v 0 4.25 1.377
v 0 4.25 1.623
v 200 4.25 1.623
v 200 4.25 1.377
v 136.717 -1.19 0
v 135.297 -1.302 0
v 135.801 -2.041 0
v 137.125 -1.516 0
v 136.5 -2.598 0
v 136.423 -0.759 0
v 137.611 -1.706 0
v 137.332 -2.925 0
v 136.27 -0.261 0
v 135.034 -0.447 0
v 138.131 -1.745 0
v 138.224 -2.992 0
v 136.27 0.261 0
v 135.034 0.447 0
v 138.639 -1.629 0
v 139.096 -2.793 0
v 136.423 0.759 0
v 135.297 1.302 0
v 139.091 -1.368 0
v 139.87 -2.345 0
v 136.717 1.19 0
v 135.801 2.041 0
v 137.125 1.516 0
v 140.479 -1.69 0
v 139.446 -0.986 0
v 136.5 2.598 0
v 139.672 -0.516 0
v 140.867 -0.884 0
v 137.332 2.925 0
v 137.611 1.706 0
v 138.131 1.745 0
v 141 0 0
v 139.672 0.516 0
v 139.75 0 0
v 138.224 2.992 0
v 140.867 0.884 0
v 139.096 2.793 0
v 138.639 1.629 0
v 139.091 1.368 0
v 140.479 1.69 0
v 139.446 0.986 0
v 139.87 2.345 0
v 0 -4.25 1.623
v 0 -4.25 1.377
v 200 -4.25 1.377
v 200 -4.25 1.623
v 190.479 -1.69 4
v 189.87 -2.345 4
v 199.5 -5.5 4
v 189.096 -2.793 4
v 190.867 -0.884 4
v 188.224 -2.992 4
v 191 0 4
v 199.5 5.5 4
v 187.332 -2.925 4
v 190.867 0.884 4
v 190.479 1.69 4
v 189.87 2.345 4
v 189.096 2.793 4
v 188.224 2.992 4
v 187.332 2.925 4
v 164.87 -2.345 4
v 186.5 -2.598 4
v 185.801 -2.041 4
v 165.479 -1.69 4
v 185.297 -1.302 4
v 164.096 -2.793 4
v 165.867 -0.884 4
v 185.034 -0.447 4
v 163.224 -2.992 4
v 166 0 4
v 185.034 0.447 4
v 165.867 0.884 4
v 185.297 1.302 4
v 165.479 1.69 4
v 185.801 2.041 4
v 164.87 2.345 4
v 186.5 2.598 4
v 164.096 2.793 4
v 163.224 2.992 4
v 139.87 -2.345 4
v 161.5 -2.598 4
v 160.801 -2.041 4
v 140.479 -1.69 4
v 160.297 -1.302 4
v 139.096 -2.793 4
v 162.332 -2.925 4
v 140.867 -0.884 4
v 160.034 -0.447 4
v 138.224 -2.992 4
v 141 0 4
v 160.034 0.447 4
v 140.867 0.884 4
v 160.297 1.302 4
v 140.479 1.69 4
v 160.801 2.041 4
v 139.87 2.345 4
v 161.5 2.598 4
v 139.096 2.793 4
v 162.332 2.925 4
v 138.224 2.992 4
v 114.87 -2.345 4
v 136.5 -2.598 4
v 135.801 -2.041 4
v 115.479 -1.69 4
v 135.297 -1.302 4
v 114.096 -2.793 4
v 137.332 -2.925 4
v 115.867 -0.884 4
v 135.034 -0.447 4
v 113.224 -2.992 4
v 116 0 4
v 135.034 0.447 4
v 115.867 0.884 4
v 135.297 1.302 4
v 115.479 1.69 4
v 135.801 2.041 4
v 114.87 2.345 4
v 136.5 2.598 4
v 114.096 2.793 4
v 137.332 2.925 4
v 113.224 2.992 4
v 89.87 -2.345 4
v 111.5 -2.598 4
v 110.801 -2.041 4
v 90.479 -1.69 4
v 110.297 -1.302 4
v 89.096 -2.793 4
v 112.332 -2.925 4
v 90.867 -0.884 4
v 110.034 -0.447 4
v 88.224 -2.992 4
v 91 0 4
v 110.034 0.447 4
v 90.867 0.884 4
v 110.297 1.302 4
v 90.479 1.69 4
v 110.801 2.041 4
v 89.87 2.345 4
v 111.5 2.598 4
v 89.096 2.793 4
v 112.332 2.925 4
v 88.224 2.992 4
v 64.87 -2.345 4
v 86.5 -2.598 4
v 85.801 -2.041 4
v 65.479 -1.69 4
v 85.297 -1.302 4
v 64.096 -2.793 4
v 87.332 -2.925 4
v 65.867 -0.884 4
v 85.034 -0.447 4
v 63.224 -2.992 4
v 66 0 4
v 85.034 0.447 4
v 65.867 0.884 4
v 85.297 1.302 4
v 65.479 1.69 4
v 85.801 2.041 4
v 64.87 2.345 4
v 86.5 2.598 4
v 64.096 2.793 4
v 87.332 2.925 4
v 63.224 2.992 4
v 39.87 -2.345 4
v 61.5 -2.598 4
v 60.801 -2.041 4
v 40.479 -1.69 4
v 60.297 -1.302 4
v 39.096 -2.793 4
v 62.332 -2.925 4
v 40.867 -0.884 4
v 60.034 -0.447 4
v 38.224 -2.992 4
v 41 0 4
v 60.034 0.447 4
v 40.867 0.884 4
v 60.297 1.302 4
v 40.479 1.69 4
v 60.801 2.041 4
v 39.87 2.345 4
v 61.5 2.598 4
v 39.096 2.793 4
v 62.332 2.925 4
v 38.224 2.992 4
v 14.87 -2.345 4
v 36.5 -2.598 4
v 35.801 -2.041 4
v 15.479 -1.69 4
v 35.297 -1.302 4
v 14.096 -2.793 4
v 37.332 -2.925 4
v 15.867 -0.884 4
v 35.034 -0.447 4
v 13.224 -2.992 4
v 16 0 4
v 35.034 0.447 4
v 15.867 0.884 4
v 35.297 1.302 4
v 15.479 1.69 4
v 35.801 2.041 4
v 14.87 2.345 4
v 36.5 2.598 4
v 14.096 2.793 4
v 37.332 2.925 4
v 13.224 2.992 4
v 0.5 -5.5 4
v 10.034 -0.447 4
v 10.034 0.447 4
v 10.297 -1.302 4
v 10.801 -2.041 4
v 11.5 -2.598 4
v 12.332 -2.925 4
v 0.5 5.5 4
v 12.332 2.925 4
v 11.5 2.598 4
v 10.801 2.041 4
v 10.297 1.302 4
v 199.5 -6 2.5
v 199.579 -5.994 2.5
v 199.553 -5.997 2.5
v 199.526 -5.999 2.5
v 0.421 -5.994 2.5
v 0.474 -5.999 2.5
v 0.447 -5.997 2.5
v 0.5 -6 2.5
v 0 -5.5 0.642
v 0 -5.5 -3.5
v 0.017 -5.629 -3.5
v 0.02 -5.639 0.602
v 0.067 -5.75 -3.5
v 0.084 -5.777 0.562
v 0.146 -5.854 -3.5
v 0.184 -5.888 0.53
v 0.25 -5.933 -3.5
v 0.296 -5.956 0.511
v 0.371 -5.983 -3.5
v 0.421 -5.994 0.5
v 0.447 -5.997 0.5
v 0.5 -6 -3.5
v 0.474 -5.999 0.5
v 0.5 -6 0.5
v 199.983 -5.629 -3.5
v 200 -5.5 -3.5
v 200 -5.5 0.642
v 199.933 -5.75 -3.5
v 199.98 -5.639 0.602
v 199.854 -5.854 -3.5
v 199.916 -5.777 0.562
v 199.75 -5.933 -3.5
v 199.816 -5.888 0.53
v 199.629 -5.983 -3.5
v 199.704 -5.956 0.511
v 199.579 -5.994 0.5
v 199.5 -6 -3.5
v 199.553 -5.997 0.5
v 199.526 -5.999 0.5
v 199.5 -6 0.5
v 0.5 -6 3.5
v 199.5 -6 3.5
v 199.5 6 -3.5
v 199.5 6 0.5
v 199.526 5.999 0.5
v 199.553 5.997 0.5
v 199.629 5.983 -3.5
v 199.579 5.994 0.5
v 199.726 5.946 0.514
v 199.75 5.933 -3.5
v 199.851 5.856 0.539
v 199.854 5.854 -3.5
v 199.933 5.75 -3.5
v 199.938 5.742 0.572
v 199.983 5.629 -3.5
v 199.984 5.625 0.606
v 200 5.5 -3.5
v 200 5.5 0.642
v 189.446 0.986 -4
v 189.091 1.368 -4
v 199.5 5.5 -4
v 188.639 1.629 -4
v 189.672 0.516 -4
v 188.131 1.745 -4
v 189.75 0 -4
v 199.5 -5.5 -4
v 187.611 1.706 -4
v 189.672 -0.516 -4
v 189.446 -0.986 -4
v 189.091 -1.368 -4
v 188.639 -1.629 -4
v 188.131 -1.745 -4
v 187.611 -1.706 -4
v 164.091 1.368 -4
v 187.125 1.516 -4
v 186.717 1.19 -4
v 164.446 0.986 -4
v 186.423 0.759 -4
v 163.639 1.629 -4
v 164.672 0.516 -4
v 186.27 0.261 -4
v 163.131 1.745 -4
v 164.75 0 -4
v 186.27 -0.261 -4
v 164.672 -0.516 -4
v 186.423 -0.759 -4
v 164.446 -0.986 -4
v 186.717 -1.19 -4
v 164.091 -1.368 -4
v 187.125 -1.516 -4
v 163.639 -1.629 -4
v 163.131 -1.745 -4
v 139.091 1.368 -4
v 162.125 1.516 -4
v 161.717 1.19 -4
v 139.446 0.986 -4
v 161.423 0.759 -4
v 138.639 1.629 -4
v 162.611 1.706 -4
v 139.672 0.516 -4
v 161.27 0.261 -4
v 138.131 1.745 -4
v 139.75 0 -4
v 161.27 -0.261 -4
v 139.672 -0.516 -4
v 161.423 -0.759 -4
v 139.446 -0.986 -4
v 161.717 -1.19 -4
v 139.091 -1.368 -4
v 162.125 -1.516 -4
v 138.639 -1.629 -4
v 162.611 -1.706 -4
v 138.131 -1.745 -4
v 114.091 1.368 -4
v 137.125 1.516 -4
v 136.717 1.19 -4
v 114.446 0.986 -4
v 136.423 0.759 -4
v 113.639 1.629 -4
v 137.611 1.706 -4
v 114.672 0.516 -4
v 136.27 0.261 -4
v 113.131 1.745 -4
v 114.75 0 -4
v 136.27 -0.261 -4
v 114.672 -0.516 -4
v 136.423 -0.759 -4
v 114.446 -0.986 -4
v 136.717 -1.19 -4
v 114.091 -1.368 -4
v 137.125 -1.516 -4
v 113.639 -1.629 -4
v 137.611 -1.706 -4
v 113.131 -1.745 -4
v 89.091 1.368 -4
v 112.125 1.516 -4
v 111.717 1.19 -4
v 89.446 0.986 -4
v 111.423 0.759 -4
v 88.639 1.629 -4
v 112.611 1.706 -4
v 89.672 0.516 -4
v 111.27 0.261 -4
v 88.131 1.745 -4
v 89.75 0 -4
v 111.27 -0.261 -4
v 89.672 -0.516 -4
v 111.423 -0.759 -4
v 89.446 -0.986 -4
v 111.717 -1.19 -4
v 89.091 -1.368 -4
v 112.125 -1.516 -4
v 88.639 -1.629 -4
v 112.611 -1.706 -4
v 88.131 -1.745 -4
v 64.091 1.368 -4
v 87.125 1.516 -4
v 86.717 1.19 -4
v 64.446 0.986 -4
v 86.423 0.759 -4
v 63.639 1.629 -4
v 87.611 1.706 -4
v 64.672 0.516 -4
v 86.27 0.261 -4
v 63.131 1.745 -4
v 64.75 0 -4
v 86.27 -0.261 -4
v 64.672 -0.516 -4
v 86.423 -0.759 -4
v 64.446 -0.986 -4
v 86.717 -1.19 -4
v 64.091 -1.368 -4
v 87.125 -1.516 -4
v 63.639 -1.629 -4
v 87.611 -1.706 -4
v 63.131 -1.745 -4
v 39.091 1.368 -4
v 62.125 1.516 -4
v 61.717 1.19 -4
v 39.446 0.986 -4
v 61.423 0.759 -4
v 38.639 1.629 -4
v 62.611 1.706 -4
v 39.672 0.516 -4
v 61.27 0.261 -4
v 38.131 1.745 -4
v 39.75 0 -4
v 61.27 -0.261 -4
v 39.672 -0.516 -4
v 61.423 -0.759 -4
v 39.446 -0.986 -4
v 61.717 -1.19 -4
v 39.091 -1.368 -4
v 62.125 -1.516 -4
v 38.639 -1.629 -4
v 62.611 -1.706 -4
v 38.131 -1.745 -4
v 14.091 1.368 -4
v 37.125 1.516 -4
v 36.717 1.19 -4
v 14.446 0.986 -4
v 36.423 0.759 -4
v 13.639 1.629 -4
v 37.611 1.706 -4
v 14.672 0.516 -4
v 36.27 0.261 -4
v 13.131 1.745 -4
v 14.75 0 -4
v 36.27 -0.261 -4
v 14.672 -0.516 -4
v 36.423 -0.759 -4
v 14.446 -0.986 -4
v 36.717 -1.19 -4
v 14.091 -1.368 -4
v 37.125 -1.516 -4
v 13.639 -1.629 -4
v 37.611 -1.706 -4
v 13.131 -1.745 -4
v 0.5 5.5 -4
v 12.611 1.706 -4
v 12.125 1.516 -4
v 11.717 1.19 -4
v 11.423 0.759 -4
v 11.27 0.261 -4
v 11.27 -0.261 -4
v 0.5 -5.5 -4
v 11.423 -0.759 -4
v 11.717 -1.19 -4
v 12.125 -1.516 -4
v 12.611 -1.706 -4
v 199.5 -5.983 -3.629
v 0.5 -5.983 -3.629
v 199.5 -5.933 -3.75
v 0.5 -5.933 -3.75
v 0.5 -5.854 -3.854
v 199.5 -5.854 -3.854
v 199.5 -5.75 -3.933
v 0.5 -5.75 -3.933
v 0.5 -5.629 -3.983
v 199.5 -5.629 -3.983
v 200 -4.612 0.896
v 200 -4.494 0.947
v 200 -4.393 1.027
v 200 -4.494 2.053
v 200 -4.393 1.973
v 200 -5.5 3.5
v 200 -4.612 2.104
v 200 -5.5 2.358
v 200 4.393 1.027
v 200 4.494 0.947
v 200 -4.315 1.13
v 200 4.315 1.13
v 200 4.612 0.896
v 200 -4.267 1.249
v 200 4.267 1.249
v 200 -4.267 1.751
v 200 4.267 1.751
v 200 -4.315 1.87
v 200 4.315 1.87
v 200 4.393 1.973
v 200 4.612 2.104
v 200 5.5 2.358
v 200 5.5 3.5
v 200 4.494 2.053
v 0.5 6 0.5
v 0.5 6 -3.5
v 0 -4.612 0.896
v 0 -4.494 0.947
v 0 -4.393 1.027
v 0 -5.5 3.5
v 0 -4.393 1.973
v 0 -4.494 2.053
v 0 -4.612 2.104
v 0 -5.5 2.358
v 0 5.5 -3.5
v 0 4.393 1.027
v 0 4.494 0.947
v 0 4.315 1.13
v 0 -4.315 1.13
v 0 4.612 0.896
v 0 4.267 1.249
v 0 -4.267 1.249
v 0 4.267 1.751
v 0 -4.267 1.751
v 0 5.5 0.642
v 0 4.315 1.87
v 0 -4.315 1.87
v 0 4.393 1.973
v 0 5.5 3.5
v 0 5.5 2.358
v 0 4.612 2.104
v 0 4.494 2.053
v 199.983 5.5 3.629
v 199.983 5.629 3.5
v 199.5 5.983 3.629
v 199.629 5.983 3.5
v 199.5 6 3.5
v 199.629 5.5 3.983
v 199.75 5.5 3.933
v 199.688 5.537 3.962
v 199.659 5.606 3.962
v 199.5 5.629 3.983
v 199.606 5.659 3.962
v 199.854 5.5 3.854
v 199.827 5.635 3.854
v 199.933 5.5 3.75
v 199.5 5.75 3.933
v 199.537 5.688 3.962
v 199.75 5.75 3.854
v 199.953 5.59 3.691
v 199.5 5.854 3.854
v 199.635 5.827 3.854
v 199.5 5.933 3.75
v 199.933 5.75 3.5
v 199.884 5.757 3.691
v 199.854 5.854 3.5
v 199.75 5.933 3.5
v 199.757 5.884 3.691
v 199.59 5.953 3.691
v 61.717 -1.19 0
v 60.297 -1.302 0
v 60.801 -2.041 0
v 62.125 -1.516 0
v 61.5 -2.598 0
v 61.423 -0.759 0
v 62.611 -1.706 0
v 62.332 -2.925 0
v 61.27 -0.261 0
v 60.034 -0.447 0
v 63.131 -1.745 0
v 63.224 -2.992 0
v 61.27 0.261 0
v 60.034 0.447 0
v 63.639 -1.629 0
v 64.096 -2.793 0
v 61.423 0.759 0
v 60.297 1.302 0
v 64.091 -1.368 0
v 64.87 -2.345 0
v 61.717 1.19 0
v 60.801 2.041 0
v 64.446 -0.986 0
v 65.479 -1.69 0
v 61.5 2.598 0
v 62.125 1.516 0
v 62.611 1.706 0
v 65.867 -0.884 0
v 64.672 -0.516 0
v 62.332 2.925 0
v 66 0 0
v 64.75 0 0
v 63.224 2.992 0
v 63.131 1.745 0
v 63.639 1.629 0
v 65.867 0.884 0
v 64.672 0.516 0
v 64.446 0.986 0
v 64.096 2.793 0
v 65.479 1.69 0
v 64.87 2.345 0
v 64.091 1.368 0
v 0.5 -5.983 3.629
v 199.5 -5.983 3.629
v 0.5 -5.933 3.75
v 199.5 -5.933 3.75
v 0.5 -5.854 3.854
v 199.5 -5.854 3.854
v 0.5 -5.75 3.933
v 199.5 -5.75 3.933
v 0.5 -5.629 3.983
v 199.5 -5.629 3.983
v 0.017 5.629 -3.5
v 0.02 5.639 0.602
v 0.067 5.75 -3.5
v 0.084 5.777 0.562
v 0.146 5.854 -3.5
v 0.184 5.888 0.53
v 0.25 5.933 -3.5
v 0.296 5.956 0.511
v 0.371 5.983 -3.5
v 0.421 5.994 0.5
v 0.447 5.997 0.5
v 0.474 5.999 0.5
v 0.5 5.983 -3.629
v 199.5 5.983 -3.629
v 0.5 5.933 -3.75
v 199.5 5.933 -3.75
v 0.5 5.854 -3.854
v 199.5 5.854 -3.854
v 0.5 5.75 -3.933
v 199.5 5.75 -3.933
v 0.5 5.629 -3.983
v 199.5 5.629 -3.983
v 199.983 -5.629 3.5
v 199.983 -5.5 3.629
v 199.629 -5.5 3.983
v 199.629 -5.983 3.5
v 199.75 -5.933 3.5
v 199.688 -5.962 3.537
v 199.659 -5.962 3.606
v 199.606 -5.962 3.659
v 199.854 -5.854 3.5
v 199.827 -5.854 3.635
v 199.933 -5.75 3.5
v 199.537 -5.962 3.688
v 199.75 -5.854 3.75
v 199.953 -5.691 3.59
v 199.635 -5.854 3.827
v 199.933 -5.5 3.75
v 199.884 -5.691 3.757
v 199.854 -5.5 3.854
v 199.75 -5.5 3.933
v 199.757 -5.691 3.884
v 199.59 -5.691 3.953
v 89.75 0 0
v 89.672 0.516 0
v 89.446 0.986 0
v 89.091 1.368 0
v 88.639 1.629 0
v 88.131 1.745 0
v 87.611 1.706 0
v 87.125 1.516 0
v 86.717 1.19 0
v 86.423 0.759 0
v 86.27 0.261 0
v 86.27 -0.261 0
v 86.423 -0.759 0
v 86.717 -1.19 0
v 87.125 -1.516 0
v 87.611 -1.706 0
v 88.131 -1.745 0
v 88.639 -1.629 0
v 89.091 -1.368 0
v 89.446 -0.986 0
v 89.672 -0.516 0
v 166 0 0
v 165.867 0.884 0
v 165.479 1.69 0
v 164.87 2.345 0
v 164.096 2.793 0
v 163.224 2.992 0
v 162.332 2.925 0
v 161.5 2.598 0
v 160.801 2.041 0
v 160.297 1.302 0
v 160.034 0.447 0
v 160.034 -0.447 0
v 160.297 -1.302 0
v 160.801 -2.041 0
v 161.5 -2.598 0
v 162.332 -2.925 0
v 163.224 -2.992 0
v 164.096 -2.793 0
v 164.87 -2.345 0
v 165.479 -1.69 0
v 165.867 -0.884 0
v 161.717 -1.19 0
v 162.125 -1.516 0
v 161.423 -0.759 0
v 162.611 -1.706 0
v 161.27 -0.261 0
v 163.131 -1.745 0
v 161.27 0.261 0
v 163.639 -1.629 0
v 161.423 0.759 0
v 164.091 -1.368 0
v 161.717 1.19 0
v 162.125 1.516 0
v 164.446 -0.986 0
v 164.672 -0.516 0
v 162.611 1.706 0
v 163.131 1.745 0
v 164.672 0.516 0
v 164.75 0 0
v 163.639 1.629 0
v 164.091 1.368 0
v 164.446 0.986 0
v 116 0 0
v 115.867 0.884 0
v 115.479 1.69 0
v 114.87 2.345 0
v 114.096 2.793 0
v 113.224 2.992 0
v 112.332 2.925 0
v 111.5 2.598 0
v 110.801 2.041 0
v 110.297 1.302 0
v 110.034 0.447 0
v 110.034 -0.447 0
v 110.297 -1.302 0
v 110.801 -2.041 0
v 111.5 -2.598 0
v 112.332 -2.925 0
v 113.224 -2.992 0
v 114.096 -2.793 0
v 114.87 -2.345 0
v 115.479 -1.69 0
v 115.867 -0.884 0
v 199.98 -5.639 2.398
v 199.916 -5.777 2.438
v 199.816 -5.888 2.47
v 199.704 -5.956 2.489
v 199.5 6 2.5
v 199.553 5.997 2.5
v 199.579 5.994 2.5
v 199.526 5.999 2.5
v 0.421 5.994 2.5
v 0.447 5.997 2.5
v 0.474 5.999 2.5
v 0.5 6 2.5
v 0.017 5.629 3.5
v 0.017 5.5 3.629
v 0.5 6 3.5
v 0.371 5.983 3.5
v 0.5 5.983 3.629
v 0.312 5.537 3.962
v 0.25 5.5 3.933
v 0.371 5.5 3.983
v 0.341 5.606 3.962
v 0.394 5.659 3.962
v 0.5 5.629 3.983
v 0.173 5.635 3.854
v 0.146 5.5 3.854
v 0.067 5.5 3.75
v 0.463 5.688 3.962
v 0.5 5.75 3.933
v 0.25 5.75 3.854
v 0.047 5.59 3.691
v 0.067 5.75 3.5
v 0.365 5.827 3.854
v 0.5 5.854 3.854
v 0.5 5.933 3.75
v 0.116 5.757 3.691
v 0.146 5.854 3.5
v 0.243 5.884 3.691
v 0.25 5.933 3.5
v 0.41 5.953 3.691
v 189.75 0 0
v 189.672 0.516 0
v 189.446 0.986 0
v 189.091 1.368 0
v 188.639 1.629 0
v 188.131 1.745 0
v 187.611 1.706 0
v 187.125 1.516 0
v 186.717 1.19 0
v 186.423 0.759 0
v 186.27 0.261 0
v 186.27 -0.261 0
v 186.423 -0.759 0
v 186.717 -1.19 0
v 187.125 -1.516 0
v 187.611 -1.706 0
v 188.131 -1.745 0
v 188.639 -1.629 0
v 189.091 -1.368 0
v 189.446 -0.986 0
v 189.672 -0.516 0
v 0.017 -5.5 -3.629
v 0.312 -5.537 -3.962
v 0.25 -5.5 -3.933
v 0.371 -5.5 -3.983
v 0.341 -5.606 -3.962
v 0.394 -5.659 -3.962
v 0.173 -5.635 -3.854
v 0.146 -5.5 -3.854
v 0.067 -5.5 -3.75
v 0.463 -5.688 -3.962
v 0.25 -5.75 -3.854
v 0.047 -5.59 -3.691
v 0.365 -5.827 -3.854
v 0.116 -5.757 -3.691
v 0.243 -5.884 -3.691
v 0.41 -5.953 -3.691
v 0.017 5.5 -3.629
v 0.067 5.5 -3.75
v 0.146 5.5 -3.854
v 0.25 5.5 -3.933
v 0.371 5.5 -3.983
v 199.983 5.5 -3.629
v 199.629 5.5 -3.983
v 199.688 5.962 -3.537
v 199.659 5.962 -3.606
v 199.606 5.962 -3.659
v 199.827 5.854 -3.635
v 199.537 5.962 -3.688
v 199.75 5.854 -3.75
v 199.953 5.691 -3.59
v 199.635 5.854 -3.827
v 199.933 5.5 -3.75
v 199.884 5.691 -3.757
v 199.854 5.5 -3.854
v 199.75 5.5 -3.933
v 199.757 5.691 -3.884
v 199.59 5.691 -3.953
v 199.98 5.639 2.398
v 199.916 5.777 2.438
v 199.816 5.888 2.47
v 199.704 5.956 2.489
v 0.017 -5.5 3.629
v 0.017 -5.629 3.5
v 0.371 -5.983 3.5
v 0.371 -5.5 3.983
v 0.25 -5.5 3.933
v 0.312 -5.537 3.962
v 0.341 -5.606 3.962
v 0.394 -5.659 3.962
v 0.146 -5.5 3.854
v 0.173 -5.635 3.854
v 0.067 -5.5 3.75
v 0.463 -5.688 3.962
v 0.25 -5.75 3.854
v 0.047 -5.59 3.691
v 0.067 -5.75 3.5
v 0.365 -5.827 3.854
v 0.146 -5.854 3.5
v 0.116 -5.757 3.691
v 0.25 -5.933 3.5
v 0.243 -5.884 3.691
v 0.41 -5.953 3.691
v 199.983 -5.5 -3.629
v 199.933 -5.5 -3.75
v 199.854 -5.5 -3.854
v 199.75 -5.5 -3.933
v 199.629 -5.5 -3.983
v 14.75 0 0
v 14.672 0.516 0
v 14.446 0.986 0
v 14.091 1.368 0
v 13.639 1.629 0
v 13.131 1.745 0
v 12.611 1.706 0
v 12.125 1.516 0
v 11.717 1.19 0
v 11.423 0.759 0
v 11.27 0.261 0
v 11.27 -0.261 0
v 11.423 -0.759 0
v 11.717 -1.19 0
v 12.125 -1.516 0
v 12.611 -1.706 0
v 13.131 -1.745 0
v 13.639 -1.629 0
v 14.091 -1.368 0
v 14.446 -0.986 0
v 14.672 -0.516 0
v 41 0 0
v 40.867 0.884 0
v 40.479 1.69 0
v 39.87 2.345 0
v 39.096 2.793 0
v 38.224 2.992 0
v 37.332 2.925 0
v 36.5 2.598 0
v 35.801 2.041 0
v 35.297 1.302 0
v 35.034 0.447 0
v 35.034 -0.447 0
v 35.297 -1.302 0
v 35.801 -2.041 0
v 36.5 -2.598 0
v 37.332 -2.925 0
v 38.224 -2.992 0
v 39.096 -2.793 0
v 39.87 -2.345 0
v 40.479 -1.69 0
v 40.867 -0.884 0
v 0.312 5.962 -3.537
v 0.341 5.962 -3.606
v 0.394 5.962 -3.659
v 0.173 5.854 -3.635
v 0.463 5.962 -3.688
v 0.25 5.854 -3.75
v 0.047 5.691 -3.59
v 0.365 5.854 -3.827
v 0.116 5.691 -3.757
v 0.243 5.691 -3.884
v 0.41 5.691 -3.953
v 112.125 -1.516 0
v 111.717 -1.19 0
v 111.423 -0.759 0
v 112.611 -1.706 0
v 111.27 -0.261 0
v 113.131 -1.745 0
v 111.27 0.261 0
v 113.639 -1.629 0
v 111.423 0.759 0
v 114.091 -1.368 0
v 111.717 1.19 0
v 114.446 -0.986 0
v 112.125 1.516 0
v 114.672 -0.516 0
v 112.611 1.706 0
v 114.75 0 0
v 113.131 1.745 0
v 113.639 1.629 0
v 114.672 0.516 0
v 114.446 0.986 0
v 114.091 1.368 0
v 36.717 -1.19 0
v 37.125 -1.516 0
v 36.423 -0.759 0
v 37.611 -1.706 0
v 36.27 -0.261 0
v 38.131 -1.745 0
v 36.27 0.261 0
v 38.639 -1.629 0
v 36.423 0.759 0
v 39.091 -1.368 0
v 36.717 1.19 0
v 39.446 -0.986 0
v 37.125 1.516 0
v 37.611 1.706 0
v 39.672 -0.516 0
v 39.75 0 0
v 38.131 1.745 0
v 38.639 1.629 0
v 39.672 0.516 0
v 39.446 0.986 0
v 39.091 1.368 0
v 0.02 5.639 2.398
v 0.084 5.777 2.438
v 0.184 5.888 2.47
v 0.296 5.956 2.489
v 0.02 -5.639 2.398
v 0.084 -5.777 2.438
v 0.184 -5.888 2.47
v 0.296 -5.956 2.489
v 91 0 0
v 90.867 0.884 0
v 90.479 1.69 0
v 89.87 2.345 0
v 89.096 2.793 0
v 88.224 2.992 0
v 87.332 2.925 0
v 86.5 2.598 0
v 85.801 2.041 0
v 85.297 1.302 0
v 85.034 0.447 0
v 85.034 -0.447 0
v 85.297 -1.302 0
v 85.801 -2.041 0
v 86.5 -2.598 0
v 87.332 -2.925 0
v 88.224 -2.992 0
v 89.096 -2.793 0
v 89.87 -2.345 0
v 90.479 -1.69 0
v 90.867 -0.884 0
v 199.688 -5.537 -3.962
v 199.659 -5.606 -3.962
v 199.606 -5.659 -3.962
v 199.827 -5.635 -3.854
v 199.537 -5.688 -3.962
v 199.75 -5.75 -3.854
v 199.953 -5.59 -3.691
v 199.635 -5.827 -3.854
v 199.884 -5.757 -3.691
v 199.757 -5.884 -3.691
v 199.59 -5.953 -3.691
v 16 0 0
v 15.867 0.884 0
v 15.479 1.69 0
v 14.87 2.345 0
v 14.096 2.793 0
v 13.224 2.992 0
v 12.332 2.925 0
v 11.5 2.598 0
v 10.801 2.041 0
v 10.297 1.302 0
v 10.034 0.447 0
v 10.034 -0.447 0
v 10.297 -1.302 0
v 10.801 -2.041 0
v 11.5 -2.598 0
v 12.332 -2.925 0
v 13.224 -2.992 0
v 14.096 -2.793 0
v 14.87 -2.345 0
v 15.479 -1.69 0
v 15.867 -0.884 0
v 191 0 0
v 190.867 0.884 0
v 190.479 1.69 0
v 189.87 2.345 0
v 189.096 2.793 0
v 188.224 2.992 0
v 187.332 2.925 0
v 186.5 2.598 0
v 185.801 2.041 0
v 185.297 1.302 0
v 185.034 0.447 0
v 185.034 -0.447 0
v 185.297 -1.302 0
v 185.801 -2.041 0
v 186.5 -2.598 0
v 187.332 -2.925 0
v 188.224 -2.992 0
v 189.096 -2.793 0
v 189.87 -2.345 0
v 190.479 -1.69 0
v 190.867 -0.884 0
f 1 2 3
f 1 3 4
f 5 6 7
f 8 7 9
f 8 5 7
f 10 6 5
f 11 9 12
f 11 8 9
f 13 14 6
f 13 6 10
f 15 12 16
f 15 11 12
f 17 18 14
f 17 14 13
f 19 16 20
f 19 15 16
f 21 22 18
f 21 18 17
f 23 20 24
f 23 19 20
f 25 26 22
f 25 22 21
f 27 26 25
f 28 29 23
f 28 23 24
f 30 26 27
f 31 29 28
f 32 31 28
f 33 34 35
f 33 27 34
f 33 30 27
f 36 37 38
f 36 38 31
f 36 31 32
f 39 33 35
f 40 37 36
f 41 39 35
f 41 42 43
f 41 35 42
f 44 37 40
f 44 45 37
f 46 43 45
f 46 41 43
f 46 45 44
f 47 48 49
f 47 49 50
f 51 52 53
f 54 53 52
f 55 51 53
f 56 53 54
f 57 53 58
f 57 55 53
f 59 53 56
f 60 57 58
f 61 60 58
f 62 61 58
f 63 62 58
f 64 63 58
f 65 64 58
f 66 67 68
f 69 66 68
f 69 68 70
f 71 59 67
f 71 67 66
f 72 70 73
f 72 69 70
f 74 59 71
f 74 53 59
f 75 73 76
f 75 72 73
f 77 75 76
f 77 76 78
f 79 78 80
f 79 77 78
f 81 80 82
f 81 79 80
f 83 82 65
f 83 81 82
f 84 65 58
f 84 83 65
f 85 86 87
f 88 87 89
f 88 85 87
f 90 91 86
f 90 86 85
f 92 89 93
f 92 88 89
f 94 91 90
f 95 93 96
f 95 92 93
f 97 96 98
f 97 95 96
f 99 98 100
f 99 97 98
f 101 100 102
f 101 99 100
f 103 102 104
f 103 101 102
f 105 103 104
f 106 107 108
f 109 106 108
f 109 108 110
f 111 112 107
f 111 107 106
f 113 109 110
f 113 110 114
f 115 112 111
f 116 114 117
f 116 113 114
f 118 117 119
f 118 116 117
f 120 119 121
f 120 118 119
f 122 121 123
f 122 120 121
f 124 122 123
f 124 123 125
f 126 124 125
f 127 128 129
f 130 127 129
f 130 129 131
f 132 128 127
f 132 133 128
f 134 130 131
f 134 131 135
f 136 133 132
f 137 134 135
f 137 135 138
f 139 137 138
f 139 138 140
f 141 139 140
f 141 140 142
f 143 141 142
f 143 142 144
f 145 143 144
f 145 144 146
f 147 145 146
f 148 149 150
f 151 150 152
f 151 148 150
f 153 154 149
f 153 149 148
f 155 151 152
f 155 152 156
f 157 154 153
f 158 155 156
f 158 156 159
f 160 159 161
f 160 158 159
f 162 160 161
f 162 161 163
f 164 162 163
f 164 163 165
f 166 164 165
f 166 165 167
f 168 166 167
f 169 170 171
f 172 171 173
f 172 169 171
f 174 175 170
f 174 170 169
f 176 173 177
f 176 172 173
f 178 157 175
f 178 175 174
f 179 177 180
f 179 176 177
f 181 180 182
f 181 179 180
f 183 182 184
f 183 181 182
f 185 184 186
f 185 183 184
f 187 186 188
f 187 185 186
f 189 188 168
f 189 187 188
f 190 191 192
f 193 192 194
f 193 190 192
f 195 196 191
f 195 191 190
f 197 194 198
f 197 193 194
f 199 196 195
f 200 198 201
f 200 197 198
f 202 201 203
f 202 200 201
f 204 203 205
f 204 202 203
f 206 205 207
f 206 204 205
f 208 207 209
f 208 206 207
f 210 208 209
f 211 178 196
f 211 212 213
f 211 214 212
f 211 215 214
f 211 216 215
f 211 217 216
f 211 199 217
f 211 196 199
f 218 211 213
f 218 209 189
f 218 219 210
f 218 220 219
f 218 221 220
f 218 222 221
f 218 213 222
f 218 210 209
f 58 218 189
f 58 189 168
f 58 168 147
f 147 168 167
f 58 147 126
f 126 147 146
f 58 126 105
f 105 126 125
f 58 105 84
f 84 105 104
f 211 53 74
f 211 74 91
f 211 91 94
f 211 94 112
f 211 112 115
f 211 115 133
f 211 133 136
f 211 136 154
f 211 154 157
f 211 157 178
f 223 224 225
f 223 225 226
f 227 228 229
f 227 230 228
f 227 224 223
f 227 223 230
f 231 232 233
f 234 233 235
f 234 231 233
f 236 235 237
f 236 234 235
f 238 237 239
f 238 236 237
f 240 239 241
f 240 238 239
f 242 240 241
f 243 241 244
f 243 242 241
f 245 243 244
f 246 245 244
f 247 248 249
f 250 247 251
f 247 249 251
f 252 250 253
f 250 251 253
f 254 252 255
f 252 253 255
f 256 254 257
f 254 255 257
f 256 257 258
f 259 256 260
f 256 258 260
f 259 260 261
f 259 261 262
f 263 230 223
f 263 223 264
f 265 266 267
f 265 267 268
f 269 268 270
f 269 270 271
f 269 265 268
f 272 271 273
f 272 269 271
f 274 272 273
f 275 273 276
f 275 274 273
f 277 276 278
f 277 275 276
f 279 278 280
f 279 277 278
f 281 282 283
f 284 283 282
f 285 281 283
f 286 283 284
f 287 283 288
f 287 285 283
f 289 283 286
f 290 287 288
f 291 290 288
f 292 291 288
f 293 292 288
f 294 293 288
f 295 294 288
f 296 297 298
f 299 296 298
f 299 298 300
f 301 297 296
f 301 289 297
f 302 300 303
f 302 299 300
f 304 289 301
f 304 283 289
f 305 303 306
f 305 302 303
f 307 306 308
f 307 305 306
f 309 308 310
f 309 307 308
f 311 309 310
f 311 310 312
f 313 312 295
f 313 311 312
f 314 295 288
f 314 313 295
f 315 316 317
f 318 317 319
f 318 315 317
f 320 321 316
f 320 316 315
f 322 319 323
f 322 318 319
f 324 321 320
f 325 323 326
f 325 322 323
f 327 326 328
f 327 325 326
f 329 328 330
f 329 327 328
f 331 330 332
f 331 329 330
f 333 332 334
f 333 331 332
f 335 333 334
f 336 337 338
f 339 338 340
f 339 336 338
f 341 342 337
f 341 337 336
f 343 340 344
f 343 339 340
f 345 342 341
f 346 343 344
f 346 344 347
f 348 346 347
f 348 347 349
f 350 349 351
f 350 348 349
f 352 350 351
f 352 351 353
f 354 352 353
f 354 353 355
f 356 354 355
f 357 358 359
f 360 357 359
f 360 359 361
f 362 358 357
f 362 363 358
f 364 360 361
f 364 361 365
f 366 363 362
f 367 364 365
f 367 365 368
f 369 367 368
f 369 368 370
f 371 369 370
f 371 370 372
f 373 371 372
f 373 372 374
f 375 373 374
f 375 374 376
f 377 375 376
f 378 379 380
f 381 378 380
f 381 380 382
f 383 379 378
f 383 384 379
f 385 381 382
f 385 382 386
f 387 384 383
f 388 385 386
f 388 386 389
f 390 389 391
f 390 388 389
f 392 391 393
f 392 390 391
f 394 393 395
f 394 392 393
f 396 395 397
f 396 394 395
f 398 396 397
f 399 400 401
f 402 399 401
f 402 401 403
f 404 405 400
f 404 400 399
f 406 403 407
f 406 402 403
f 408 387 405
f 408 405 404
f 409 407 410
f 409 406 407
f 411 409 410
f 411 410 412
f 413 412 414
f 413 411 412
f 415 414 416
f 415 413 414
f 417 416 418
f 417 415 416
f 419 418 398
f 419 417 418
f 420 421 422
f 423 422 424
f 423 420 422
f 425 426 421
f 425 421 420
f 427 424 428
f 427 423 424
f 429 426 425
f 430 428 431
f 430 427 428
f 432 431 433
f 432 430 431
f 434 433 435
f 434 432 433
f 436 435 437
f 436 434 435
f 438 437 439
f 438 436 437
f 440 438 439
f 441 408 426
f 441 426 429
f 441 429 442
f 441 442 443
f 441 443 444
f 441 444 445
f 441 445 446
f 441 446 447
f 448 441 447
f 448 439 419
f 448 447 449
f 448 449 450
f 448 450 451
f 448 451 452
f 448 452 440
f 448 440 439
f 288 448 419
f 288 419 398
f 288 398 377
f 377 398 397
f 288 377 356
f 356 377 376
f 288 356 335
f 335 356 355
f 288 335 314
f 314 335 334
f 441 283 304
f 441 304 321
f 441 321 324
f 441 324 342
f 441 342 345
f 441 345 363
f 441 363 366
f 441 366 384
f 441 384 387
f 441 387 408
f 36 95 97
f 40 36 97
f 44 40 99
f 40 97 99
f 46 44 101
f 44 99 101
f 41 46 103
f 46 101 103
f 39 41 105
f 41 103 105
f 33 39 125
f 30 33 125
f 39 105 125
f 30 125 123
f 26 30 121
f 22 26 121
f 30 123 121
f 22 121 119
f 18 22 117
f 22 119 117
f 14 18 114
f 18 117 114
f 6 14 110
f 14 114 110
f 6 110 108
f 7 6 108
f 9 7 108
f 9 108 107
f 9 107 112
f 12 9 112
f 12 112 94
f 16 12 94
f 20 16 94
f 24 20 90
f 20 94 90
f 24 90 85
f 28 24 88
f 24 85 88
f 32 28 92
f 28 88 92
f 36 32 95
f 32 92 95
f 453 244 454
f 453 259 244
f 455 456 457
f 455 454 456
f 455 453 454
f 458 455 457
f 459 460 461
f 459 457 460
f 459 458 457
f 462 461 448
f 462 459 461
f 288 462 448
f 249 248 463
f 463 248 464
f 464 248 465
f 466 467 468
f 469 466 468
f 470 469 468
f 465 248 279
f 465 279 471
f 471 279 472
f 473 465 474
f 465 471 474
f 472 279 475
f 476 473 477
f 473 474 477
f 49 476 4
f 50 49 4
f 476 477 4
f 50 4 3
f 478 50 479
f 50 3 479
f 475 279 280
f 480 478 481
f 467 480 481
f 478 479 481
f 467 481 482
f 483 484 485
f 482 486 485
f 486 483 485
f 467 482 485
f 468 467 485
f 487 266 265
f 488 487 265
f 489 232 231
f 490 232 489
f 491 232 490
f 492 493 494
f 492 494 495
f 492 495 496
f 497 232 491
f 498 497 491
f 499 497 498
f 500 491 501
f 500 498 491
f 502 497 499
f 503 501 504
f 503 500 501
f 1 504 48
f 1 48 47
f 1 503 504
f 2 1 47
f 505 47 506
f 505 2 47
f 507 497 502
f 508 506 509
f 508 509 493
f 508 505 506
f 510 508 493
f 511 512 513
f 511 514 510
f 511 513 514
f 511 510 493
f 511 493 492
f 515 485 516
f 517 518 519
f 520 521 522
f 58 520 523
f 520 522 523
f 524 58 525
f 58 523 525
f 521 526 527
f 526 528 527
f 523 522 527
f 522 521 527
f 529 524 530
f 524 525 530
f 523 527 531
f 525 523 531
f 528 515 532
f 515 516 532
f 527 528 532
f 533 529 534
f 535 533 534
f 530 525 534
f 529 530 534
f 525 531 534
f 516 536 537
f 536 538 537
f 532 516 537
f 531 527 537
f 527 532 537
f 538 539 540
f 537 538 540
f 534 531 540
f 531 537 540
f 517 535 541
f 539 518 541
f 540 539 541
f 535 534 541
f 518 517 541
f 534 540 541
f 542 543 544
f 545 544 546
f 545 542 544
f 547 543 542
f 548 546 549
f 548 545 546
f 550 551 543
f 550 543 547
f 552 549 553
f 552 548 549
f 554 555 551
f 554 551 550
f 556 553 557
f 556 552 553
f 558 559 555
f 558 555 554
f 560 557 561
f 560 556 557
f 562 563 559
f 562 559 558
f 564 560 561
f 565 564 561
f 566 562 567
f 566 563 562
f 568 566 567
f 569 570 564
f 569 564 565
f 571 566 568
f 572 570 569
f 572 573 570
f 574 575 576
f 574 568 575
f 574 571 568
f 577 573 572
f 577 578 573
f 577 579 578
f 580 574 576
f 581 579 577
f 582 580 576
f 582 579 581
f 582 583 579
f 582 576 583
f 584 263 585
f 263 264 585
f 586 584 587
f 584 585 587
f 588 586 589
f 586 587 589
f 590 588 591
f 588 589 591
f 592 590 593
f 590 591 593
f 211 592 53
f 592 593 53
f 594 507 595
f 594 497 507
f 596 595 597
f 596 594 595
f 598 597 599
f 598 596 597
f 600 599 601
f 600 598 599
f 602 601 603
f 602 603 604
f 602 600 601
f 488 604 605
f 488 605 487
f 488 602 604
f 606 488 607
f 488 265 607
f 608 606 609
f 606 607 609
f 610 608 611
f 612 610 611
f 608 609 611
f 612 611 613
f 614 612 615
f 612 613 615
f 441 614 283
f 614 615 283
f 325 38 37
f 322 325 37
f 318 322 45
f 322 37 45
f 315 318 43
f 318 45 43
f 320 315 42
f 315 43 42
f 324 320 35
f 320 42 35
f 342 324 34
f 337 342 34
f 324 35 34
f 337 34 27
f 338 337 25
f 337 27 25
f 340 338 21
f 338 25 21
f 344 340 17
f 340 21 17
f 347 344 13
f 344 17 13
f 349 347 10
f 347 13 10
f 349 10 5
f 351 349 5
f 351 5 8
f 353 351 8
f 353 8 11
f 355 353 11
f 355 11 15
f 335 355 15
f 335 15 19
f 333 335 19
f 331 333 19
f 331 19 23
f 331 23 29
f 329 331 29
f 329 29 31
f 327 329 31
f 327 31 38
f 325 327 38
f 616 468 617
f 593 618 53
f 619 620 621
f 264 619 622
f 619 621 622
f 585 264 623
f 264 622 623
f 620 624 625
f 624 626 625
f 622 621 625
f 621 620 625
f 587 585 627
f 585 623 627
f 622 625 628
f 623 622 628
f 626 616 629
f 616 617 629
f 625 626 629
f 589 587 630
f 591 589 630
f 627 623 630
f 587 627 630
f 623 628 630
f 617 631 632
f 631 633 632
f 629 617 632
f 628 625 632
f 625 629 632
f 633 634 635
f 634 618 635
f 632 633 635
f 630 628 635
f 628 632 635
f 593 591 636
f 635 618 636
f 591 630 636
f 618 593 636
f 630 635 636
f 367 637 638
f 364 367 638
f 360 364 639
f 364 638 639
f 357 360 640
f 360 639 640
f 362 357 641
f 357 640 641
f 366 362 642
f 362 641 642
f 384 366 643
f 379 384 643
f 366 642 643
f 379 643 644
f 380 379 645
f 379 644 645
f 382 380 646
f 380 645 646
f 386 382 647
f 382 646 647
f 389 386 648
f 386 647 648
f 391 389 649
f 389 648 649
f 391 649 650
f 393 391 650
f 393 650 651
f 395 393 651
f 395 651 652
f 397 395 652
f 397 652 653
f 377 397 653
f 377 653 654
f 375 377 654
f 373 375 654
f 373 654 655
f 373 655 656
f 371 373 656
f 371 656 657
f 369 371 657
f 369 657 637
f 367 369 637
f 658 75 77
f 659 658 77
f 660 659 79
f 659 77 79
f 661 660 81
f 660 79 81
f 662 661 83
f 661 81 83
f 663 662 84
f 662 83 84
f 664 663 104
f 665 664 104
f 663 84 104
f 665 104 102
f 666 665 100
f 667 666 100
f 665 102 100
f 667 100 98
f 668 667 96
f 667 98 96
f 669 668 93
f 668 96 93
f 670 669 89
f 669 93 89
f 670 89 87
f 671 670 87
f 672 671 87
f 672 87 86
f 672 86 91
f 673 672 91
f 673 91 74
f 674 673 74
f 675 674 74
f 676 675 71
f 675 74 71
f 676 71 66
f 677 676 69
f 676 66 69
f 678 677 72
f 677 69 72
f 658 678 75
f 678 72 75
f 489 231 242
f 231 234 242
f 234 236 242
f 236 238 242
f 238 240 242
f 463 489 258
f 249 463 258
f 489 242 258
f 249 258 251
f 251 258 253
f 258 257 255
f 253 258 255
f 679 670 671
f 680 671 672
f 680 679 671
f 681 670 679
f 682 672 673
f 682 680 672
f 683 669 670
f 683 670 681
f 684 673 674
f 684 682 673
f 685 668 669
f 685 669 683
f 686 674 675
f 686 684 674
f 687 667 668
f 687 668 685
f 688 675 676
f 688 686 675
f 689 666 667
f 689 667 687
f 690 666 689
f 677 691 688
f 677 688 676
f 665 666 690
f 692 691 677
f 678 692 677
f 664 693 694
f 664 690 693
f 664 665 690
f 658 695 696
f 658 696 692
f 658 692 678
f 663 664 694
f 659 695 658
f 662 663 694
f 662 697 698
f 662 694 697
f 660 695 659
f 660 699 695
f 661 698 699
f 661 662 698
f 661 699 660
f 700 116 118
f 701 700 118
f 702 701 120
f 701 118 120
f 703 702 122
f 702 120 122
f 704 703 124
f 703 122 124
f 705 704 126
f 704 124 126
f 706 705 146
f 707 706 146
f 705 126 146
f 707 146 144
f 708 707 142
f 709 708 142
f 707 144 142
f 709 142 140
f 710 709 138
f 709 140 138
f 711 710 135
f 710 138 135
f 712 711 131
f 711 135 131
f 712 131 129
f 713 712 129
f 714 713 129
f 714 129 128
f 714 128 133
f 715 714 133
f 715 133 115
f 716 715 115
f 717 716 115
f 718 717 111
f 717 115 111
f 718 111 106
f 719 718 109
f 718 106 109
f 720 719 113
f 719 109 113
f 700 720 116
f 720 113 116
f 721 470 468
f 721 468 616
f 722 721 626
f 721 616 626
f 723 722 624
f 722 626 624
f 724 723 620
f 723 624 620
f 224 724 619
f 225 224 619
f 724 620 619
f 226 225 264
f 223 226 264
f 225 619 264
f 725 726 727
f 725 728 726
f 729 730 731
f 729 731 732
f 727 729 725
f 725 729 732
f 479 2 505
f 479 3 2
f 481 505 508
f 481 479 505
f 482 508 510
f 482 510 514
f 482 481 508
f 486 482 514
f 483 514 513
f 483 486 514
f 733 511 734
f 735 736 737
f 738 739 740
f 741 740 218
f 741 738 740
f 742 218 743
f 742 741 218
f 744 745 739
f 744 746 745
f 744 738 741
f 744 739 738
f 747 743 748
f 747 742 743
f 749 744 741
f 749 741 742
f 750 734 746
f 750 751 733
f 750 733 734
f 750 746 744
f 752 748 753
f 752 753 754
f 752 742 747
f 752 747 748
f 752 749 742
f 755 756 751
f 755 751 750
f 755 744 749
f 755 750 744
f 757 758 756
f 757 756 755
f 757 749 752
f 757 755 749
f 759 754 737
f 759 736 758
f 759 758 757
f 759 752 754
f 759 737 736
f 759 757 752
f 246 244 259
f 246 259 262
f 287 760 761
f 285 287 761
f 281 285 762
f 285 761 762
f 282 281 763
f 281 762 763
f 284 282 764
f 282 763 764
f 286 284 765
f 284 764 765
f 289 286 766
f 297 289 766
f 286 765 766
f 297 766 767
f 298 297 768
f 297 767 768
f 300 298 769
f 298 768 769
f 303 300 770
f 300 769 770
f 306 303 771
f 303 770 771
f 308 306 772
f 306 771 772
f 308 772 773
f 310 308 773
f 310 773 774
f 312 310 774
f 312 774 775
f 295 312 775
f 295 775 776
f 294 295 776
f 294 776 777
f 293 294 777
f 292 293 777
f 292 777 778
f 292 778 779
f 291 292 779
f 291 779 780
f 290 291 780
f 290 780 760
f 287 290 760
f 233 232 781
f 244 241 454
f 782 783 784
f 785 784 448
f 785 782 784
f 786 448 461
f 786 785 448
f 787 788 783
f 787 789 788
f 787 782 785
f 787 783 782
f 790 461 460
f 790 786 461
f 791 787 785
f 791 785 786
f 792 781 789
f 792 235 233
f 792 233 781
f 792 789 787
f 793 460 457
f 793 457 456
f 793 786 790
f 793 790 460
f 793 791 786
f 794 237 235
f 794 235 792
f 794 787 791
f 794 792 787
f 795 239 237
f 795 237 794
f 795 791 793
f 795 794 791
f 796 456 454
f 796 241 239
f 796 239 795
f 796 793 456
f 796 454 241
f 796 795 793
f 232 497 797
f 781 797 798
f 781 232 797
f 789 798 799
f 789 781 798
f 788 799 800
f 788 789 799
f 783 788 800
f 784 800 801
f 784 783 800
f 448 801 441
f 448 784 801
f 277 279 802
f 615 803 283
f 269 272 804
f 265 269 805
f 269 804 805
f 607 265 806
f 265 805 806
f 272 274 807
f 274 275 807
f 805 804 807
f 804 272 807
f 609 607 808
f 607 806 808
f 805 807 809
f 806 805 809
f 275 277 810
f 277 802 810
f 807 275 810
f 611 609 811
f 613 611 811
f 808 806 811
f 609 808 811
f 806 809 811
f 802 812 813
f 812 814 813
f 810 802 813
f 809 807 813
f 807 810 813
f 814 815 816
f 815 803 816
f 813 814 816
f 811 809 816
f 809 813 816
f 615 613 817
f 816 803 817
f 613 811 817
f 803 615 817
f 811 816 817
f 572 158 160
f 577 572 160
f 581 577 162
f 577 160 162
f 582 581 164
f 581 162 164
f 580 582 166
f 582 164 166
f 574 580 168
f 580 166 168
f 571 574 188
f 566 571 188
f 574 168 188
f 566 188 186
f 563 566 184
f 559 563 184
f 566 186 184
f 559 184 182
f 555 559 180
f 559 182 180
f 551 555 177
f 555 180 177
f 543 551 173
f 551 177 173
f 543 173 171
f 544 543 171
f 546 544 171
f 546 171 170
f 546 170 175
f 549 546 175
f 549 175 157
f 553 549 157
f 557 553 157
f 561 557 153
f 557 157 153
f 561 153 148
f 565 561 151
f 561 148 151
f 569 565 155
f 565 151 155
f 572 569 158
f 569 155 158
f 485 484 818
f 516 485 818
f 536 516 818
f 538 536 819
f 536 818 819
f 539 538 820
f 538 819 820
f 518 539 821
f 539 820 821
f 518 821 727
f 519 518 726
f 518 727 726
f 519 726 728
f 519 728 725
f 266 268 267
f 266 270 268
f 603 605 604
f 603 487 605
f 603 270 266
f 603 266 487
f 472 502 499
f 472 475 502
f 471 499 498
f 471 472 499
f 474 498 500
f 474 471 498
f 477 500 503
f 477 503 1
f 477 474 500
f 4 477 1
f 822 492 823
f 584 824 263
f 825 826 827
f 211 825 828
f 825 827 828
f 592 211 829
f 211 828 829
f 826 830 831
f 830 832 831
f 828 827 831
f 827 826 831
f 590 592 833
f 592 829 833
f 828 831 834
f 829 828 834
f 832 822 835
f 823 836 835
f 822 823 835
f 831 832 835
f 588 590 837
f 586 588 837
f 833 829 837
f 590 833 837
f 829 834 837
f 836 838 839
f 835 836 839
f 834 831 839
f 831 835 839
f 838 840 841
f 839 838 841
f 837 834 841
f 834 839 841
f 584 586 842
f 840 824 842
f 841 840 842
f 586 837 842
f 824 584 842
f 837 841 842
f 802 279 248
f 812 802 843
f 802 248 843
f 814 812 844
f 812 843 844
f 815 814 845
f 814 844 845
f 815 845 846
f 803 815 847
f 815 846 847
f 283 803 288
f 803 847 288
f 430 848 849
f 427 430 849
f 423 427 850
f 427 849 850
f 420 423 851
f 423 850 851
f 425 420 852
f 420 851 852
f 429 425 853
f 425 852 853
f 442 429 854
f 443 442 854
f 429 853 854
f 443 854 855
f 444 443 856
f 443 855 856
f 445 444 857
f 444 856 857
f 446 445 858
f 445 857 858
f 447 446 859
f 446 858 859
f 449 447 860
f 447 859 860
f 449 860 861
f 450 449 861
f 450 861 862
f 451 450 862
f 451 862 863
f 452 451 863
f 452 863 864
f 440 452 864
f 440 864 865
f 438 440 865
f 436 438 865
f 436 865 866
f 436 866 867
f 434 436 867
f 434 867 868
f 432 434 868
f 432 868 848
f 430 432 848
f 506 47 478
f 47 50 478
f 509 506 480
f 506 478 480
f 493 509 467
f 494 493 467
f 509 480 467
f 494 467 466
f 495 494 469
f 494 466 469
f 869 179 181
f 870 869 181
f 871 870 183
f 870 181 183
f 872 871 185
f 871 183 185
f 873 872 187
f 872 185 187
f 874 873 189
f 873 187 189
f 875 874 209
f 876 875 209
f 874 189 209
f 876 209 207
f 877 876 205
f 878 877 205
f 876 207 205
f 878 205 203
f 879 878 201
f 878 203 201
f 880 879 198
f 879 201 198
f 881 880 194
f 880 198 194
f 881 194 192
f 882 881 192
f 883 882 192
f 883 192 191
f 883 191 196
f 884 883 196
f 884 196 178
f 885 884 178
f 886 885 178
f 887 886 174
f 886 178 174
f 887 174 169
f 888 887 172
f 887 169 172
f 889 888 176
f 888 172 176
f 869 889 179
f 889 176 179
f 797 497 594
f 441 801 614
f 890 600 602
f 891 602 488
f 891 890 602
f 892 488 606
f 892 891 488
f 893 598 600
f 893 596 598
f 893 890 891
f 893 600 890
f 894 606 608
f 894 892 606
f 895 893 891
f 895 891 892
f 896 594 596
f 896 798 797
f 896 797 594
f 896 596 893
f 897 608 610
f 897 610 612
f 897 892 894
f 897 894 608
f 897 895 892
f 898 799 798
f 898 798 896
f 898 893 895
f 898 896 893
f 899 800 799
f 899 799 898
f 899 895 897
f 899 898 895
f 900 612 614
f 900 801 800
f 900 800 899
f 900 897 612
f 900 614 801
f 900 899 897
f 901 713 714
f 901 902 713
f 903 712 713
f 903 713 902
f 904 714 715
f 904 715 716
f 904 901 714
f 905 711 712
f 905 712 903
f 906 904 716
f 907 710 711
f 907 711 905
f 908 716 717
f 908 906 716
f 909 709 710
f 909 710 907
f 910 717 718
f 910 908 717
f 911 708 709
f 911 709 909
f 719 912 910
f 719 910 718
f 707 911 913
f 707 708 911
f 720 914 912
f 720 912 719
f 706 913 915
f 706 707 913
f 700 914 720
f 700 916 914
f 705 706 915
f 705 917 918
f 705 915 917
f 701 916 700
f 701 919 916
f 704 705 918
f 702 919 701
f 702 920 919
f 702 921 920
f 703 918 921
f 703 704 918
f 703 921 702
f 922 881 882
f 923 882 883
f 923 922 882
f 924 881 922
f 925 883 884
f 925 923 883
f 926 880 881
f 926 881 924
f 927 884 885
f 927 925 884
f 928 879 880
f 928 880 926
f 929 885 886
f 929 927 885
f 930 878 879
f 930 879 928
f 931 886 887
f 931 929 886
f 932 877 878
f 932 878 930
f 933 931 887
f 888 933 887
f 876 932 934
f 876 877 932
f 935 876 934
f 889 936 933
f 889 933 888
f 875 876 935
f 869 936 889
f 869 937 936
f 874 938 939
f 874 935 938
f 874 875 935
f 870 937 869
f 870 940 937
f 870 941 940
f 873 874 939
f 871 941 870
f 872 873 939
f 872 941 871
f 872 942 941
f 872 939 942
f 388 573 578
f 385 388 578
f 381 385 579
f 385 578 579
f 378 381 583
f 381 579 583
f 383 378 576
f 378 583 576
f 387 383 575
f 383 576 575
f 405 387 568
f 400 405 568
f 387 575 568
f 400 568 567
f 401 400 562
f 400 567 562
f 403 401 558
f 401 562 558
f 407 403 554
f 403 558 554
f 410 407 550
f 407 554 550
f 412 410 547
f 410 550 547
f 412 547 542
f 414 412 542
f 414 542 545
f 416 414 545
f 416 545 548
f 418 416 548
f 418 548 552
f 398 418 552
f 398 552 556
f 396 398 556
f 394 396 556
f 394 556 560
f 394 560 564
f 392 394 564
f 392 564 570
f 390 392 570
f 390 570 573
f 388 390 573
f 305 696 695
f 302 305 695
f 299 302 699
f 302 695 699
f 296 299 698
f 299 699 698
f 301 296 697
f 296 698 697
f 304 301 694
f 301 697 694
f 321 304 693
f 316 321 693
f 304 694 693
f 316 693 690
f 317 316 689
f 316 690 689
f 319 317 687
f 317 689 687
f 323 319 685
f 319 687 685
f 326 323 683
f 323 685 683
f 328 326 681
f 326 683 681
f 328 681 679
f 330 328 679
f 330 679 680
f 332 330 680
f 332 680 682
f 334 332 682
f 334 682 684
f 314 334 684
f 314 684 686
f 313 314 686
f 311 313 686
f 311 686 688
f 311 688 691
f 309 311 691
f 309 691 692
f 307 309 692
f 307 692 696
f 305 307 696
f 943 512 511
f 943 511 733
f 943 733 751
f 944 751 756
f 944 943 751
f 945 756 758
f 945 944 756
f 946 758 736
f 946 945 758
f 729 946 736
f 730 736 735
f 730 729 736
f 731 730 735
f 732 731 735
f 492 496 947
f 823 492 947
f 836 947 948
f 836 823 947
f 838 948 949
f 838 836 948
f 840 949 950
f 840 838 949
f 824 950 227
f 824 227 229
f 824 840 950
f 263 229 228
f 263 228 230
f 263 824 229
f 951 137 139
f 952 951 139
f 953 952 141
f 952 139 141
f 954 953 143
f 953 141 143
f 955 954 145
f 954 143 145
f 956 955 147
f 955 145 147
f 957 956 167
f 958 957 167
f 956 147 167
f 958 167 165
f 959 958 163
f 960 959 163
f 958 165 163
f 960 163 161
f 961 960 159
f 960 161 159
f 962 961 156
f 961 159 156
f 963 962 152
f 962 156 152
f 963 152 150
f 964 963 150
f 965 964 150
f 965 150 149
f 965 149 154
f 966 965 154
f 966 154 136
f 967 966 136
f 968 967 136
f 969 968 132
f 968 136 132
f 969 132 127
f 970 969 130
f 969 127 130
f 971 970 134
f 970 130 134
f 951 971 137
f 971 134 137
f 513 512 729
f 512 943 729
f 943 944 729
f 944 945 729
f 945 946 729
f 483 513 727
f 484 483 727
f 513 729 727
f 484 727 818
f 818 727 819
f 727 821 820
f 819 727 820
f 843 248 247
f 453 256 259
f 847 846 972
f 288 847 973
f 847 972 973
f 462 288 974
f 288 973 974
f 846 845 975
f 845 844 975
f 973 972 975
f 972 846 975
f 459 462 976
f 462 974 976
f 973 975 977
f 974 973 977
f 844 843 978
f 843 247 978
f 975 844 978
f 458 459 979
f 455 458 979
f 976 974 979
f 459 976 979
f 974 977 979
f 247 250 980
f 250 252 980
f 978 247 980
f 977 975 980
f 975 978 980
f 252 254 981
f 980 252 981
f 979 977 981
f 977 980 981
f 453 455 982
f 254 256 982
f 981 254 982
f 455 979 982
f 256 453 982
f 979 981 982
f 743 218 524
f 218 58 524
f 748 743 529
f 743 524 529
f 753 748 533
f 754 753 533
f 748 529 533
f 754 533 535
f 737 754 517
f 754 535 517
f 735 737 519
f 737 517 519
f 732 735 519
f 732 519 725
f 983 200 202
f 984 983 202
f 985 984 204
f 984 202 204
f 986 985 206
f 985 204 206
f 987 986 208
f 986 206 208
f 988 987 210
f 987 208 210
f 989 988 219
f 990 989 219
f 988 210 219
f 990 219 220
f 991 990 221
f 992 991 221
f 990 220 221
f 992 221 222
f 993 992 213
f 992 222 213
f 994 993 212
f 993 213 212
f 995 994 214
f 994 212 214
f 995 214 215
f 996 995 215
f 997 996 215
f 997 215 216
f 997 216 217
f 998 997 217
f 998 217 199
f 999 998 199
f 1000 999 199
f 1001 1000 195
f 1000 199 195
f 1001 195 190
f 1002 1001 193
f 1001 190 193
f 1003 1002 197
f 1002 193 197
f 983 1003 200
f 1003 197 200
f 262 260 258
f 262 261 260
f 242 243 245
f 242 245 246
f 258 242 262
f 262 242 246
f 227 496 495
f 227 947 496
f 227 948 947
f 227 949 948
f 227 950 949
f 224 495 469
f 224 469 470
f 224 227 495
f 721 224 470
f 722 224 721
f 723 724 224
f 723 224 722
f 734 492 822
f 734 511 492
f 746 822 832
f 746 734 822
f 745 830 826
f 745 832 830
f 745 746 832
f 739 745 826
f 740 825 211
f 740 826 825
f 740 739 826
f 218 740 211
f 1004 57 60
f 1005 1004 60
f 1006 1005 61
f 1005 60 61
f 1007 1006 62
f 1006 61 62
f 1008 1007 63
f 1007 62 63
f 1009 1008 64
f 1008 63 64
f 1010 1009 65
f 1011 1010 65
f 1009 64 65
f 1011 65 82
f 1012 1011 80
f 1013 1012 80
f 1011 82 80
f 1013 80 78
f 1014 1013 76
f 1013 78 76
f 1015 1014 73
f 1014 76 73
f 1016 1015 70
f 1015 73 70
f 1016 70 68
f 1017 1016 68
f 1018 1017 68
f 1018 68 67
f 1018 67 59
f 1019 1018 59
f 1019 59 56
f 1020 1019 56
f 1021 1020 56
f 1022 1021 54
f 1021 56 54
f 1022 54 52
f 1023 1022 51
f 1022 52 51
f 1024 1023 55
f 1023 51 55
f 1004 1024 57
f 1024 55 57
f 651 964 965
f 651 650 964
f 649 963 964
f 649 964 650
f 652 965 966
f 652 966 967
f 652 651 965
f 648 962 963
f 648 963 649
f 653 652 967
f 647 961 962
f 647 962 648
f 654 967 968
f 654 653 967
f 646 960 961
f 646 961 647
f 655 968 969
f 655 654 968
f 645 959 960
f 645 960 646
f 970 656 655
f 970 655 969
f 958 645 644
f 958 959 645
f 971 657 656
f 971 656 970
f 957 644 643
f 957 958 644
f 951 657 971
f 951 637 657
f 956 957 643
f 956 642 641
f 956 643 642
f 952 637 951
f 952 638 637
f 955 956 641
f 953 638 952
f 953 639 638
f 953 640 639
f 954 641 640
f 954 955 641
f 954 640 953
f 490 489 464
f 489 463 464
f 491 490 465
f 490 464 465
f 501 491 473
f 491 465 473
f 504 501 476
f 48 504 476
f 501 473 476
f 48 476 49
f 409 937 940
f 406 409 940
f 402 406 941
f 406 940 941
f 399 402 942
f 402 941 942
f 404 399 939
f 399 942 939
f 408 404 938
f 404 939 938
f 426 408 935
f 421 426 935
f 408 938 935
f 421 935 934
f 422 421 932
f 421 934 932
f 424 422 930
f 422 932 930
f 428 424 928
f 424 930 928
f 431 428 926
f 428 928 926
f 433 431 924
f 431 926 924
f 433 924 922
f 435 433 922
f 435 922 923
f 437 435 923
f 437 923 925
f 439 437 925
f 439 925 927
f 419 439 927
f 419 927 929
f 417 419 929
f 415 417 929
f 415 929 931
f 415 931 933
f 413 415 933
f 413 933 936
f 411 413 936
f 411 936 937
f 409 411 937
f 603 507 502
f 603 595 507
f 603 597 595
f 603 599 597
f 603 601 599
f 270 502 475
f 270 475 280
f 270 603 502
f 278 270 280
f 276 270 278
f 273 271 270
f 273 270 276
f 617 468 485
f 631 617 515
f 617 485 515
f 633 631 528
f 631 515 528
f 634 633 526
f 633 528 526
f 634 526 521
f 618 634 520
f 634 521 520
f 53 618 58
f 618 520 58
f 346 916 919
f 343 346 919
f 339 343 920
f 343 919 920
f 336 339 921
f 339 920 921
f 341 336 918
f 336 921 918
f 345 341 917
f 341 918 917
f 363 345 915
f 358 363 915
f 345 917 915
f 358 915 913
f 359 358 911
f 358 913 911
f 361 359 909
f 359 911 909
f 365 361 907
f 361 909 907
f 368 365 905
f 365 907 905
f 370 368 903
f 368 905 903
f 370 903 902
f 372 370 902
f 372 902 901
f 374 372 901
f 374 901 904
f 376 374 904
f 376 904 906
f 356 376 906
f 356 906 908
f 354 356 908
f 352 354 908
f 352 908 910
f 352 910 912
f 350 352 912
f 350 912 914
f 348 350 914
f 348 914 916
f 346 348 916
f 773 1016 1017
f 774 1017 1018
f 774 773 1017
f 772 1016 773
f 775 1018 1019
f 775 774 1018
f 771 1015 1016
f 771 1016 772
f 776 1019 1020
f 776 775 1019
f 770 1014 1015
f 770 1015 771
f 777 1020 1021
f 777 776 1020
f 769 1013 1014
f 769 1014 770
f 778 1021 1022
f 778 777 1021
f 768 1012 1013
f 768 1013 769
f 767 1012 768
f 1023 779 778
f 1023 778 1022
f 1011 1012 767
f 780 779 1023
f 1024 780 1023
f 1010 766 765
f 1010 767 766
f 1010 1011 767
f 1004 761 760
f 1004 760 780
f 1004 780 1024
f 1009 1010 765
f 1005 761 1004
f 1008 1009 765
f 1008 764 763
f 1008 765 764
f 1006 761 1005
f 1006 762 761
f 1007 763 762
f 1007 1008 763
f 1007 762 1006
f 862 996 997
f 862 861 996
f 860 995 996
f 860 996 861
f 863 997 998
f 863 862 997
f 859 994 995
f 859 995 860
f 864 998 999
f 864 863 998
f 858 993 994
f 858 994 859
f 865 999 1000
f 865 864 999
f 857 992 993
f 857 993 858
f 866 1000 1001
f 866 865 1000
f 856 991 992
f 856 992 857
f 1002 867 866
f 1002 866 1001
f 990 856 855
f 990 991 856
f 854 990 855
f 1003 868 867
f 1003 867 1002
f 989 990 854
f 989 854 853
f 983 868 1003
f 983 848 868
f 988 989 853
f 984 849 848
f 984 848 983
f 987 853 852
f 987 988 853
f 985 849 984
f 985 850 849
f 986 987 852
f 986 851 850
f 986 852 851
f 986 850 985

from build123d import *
from OCP.BRepFilletAPI import BRepFilletAPI_MakeChamfer

# Parameters (mm, degrees)
BOSS_EXTRUDE1_DEPTH = 200
SKETCH2_R           = 1.75
CUT_EXTRUDE1_DEPTH  = 10
SKETCH3_R           = 3
CUT_EXTRUDE2_DEPTH  = 4
CHAMFER1_SIZE       = 0.5
CHAMFER1_SIZE2      = 1.743707222
FILLET1_R           = 0.5


with BuildPart() as part:
    # Sketch1 → Boss-Extrude1 (new body)
    with BuildSketch(Plane(origin=(0, 0, 0), x_dir=(0, 0, -1), z_dir=(1, 0, 0))):
        Polygon((-0.5, 6), (4, 6), (4, -6), (-0.5, -6), (-0.5, -4.25), (-2.5, -4.25), (-2.5, -6), (-4, -6), (-4, 6), (-2.5, 6), (-2.5, 4.25), (-0.5, 4.25), align=None)
    extrude(amount=BOSS_EXTRUDE1_DEPTH)

    # Sketch2 → Cut-Extrude1 (cut)
    with BuildSketch(Plane.XY.offset(4)):
        with Locations((13, 0)):
            Circle(SKETCH2_R)
        with Locations((38, 0)):
            Circle(SKETCH2_R)
        with Locations((63, 0)):
            Circle(SKETCH2_R)
        with Locations((88, 0)):
            Circle(SKETCH2_R)
        with Locations((113, 0)):
            Circle(SKETCH2_R)
        with Locations((138, 0)):
            Circle(SKETCH2_R)
        with Locations((163, 0)):
            Circle(SKETCH2_R)
        with Locations((188, 0)):
            Circle(SKETCH2_R)
        with Locations((213, 0)):
            Circle(SKETCH2_R)
        with Locations((238, 0)):
            Circle(SKETCH2_R)
        with Locations((263, 0)):
            Circle(SKETCH2_R)
        with Locations((288, 0)):
            Circle(SKETCH2_R)
        with Locations((313, 0)):
            Circle(SKETCH2_R)
        with Locations((338, 0)):
            Circle(SKETCH2_R)
        with Locations((363, 0)):
            Circle(SKETCH2_R)
        with Locations((388, 0)):
            Circle(SKETCH2_R)
    extrude(amount=-CUT_EXTRUDE1_DEPTH, mode=Mode.SUBTRACT)

    # Sketch3 → Cut-Extrude2 (cut)
    with BuildSketch(Plane.XY.offset(4)):
        with Locations((13, 0)):
            Circle(SKETCH3_R)
        with Locations((38, 0)):
            Circle(SKETCH3_R)
        with Locations((63, 0)):
            Circle(SKETCH3_R)
        with Locations((88, 0)):
            Circle(SKETCH3_R)
        with Locations((113, 0)):
            Circle(SKETCH3_R)
        with Locations((138, 0)):
            Circle(SKETCH3_R)
        with Locations((163, 0)):
            Circle(SKETCH3_R)
        with Locations((188, 0)):
            Circle(SKETCH3_R)
        with Locations((213, 0)):
            Circle(SKETCH3_R)
        with Locations((238, 0)):
            Circle(SKETCH3_R)
        with Locations((263, 0)):
            Circle(SKETCH3_R)
        with Locations((288, 0)):
            Circle(SKETCH3_R)
        with Locations((313, 0)):
            Circle(SKETCH3_R)
        with Locations((338, 0)):
            Circle(SKETCH3_R)
        with Locations((363, 0)):
            Circle(SKETCH3_R)
        with Locations((388, 0)):
            Circle(SKETCH3_R)
    extrude(amount=-CUT_EXTRUDE2_DEPTH, mode=Mode.SUBTRACT)

    # Chamfer1: one chamfer whose edges measure the first distance from different faces: ONE call of the kernel's chamfer builder (chamfer() names one face for all edges)
    chamfer1_edges_1 = [part.edges().sort_by_distance(p)[0] for p in [
        (100, -4.25, 0.5),
        (100, -4.25, 2.5),
    ]]
    chamfer1_side_1 = [part.faces().sort_by_distance(p)[0] for p in [
        (100, -4.25, 1.5),
    ]]
    chamfer1_edges_2 = [part.edges().sort_by_distance(p)[0] for p in [
        (100, 4.25, 2.5),
        (100, 4.25, 0.5),
    ]]
    chamfer1_side_2 = [part.faces().sort_by_distance(p)[0] for p in [
        (100, 4.25, 1.5),
    ]]
    chamfer1 = BRepFilletAPI_MakeChamfer(part.part.solid().wrapped)
    for e in chamfer1_edges_1:
        chamfer1.Add(CHAMFER1_SIZE, CHAMFER1_SIZE2, e.wrapped, chamfer1_side_1[0].wrapped)  # the first distance lies on this face
    for e in chamfer1_edges_2:
        chamfer1.Add(CHAMFER1_SIZE, CHAMFER1_SIZE2, e.wrapped, chamfer1_side_2[0].wrapped)  # the first distance lies on this face
    add(Compound.cast(chamfer1.Shape()), mode=Mode.REPLACE)

    # Fillet1
    fillet1_edges = [part.edges().sort_by_distance(p)[0] for p in [
        (200, -6, -1.75),
        (200, 0, -4),
        (200, 6, -1.75),
        (200, 6, 3.25),
        (200, 0, 4),
        (200, -6, 3.25),
        (0, -6, 3.25),
        (0, -6, -1.75),
        (0, 0, -4),
        (0, 6, -1.75),
        (0, 6, 3.25),
        (0, 0, 4),
        (100, -4.25, 1),
        (100, -4.25, 2),
        (100, 4.25, 2),
        (100, 4.25, 1),
        (100, -6, 4),
        (100, 6, 4),
        (100, -6, -4),
        (100, 6, -4),
    ]]
    fillet(fillet1_edges, radius=FILLET1_R)


solid = part.part
